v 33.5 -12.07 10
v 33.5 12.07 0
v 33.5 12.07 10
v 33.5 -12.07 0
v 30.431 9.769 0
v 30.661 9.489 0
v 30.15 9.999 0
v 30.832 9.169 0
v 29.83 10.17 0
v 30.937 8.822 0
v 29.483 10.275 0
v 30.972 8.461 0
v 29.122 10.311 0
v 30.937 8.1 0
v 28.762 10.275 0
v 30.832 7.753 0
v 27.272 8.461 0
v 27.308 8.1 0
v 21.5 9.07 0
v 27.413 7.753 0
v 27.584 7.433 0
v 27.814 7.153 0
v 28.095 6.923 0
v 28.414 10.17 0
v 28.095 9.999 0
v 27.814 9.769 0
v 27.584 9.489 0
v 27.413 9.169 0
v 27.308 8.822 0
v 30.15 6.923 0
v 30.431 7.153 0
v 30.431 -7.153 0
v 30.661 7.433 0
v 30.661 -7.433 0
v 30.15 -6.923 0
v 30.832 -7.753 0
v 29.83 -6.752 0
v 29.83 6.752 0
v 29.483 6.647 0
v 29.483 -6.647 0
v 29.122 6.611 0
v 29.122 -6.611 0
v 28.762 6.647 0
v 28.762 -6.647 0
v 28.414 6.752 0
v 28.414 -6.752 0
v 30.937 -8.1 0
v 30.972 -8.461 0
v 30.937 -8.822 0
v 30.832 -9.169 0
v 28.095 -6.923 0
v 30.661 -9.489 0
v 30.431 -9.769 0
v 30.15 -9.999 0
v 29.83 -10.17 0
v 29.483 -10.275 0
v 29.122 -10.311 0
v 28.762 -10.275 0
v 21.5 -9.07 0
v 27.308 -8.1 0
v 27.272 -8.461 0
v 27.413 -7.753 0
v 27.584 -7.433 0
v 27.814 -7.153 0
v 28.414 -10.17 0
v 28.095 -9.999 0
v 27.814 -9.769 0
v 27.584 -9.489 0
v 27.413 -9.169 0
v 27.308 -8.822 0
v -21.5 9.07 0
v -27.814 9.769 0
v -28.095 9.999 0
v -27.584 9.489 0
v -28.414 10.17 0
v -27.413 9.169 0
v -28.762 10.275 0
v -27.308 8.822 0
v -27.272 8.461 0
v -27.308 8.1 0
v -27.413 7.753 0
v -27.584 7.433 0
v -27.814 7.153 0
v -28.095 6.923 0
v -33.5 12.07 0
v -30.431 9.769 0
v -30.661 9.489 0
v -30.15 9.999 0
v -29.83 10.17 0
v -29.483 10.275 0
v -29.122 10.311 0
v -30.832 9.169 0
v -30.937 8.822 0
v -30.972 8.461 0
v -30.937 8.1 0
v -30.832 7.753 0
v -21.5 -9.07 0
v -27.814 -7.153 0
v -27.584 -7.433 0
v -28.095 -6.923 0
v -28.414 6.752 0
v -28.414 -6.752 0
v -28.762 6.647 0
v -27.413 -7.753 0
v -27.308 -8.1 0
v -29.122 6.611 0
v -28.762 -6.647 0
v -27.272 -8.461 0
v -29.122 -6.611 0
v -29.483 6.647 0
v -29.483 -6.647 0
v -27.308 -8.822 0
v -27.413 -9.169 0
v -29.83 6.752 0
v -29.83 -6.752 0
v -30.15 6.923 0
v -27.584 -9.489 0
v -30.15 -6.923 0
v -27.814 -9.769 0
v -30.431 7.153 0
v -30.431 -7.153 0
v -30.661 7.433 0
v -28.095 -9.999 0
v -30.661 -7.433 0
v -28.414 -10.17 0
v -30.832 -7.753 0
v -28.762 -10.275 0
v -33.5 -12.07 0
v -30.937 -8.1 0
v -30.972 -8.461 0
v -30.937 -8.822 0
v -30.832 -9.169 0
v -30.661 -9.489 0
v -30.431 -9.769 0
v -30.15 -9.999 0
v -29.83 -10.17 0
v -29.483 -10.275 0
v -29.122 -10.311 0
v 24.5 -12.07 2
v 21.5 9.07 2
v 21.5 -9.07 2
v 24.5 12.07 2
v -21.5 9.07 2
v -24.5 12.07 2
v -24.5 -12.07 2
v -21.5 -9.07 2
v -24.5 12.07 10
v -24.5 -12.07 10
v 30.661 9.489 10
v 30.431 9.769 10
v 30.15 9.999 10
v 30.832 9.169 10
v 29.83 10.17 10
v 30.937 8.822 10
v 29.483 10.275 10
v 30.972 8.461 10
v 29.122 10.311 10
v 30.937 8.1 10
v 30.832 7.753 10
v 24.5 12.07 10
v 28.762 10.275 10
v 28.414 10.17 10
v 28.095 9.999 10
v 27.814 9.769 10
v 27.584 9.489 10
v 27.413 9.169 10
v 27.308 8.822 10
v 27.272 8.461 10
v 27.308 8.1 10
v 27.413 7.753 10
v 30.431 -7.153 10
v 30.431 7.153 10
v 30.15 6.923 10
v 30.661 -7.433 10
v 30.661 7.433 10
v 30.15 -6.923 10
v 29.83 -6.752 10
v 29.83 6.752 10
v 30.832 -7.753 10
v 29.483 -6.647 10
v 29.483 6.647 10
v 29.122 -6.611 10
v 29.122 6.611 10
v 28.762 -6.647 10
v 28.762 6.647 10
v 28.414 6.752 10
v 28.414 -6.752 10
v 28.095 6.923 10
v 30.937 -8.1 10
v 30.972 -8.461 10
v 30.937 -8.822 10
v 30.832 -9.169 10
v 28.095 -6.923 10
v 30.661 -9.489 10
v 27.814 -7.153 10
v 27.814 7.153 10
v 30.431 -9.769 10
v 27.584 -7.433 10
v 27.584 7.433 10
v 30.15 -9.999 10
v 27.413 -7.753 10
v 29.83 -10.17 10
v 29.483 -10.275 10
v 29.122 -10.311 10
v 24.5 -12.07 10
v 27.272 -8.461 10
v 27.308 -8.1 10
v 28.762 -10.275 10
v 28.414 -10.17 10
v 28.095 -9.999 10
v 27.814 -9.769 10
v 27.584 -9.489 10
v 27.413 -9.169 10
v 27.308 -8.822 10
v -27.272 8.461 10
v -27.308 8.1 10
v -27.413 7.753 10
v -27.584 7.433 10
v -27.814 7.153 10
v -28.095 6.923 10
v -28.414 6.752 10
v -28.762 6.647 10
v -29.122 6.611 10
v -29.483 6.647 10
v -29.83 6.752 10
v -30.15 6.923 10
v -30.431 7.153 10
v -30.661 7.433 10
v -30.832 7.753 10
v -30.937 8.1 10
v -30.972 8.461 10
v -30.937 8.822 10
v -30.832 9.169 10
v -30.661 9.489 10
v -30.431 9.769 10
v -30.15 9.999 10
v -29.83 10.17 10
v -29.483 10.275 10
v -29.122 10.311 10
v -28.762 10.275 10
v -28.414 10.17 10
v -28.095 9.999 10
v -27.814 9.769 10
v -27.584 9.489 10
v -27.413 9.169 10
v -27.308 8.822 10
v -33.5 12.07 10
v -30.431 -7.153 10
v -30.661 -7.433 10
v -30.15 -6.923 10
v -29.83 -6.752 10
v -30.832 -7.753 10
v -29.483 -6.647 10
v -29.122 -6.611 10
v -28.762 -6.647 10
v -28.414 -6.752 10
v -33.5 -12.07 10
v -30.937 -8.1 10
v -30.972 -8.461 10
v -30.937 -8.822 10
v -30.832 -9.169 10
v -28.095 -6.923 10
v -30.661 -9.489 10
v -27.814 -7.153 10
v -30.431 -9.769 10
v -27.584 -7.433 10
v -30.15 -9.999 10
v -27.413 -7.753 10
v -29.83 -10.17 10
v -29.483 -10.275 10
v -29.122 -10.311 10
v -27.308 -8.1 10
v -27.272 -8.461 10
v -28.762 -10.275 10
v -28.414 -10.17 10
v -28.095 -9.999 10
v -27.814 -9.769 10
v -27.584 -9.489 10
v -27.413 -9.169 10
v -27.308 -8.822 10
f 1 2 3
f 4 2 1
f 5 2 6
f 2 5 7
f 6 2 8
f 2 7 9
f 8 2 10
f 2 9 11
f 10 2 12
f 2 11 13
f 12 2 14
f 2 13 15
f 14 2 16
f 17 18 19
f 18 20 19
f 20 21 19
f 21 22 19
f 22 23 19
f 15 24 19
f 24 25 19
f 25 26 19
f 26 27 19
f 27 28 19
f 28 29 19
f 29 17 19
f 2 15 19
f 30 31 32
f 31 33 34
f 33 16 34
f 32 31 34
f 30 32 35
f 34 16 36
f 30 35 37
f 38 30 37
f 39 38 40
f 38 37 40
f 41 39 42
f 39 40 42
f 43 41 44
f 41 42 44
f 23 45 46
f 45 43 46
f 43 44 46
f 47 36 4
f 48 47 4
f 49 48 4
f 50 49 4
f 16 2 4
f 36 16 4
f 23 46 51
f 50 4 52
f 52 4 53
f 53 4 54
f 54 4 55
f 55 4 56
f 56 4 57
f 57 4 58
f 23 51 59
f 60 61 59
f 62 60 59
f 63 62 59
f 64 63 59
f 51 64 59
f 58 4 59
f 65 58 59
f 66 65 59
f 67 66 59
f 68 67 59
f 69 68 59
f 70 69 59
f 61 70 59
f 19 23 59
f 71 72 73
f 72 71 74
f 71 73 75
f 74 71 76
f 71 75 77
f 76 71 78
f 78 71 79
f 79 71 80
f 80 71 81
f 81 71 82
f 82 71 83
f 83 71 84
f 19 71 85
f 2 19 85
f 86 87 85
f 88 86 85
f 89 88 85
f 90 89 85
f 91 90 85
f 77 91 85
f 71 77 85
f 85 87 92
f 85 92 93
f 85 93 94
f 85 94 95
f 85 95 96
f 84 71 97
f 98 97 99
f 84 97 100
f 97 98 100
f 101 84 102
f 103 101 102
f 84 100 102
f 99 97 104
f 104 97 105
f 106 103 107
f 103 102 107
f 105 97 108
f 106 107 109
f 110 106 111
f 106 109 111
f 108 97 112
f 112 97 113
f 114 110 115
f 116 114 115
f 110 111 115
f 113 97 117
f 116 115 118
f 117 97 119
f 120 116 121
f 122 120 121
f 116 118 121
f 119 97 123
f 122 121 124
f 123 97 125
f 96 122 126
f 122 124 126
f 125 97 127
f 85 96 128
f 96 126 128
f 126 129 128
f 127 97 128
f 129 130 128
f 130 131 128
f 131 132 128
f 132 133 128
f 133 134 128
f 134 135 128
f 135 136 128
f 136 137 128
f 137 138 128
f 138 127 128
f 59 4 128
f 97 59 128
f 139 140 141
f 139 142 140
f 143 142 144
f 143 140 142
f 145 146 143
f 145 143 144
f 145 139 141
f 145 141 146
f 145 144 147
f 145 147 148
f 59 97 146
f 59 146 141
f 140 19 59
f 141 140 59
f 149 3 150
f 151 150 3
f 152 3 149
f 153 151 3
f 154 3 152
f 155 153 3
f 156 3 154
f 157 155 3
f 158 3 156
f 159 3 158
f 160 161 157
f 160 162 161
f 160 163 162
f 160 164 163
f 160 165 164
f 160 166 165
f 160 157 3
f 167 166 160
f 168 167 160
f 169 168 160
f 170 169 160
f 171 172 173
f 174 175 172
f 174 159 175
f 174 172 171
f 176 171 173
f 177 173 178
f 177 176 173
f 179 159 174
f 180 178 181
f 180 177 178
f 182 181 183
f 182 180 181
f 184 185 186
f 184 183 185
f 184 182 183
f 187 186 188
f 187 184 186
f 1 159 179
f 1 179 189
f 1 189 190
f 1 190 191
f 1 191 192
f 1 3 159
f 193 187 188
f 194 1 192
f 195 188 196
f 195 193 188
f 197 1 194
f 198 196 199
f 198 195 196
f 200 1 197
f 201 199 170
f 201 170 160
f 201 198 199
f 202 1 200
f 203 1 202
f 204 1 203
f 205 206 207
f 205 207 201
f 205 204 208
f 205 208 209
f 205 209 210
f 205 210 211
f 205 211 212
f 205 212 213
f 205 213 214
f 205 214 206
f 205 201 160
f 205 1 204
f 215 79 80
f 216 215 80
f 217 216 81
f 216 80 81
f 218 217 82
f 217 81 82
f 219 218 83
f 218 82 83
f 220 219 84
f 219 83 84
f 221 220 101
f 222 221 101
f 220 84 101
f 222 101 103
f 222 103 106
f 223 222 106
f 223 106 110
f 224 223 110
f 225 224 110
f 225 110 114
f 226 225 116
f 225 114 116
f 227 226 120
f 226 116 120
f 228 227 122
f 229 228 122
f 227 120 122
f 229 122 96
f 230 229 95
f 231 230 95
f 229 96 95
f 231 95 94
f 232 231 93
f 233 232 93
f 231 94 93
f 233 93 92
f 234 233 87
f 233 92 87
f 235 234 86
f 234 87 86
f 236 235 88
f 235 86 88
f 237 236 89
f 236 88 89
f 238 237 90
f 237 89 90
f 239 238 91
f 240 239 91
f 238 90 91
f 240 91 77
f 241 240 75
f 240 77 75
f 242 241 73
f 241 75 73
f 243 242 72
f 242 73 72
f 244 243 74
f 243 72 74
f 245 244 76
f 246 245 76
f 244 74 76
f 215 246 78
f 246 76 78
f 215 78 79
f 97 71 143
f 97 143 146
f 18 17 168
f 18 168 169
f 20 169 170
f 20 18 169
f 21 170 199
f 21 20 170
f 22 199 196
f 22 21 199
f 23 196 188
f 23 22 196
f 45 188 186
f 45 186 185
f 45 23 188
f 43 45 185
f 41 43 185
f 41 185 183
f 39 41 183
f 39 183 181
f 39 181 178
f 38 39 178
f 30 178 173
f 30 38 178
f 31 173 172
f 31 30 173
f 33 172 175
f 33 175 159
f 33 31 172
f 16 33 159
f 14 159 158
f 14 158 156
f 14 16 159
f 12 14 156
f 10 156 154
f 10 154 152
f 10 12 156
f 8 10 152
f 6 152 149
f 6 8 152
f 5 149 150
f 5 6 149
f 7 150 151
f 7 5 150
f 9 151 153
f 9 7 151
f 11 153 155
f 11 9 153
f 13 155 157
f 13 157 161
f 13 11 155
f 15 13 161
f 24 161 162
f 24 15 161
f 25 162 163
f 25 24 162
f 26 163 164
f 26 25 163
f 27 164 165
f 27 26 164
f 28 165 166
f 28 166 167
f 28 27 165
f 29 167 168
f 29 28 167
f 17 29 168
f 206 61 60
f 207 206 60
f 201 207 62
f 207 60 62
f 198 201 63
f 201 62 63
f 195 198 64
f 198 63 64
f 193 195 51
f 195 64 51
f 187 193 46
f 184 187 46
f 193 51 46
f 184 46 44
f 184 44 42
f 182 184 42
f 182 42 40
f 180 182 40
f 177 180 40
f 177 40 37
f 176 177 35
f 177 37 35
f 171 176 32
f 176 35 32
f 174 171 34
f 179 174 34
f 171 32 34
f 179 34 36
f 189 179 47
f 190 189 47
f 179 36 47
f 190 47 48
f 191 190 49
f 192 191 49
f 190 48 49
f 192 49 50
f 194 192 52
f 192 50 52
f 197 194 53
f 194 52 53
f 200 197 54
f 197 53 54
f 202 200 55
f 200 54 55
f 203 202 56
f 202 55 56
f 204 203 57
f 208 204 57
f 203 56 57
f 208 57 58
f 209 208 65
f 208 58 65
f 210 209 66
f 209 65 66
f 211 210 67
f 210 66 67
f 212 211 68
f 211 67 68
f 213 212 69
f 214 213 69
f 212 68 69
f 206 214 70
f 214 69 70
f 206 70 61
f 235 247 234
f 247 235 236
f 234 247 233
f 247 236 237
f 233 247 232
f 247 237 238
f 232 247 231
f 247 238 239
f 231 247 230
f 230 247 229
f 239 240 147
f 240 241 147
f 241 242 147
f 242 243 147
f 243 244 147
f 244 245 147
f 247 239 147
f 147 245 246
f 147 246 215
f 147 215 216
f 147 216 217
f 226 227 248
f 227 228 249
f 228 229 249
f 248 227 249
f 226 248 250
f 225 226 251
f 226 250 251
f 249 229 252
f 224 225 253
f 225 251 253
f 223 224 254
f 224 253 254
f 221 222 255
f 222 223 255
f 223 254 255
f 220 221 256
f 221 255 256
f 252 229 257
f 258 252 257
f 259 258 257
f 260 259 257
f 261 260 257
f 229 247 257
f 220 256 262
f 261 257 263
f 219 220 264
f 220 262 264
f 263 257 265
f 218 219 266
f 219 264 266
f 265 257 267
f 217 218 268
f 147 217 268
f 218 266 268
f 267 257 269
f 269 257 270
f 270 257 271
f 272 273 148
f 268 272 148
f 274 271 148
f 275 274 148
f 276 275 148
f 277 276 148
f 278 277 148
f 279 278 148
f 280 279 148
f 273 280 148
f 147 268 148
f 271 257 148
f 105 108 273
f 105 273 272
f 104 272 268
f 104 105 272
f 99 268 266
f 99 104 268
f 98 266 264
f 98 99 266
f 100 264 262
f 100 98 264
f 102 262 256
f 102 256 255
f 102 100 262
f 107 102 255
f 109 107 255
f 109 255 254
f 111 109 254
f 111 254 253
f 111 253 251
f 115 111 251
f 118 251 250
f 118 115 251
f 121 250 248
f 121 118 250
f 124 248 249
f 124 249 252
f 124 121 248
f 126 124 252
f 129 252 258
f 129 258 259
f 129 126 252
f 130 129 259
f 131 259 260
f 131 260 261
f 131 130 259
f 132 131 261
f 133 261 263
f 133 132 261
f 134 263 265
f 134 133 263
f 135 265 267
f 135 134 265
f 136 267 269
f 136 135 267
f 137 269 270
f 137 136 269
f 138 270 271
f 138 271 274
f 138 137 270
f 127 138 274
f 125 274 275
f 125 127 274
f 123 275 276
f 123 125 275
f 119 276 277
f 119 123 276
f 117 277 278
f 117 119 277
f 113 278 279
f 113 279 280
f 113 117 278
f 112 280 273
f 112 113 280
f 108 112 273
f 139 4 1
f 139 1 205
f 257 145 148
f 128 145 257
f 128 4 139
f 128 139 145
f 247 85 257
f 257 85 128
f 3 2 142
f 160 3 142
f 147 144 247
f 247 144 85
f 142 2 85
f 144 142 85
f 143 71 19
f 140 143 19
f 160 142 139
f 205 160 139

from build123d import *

# Parameters (mm, degrees)
F1_DEPTH = 2
F0_W     = 9
F0_H     = 12.07
F0_R     = 1.85
F2_DEPTH = 10


with BuildPart() as f1:
    # F0 (on Top) → F1 (new body)
    with BuildSketch(Plane.XY):
        Polygon((-21.5, -9.07), (-21.5, 0), (-24.5, 0), (-24.5, -12.07), (0, -12.07), (0, -9.07), align=None)
    extrude(amount=F1_DEPTH)

    # F0 (on Top) → F2 (join)
    with BuildSketch(Plane.XY):
        with Locations((-29, -6.035)):
            Rectangle(F0_W, F0_H)
        with Locations((-29.12242, -8.461017)):
            Circle(F0_R, mode=Mode.SUBTRACT)
    extrude(amount=F2_DEPTH)

    # F3: F1 across face


with BuildPart() as f1_1:
    add(f1.part)
    add(f1.part.mirror(Plane(origin=(-28.625, 0, 4.75), x_dir=(-1, 0, 0), z_dir=(0, 1, 0))))

    # F4: F1 across plane


with BuildPart() as f1_2:
    add(f1_1.part)
    add(f1_1.part.mirror(Plane.YZ))


solid = f1_2.part
